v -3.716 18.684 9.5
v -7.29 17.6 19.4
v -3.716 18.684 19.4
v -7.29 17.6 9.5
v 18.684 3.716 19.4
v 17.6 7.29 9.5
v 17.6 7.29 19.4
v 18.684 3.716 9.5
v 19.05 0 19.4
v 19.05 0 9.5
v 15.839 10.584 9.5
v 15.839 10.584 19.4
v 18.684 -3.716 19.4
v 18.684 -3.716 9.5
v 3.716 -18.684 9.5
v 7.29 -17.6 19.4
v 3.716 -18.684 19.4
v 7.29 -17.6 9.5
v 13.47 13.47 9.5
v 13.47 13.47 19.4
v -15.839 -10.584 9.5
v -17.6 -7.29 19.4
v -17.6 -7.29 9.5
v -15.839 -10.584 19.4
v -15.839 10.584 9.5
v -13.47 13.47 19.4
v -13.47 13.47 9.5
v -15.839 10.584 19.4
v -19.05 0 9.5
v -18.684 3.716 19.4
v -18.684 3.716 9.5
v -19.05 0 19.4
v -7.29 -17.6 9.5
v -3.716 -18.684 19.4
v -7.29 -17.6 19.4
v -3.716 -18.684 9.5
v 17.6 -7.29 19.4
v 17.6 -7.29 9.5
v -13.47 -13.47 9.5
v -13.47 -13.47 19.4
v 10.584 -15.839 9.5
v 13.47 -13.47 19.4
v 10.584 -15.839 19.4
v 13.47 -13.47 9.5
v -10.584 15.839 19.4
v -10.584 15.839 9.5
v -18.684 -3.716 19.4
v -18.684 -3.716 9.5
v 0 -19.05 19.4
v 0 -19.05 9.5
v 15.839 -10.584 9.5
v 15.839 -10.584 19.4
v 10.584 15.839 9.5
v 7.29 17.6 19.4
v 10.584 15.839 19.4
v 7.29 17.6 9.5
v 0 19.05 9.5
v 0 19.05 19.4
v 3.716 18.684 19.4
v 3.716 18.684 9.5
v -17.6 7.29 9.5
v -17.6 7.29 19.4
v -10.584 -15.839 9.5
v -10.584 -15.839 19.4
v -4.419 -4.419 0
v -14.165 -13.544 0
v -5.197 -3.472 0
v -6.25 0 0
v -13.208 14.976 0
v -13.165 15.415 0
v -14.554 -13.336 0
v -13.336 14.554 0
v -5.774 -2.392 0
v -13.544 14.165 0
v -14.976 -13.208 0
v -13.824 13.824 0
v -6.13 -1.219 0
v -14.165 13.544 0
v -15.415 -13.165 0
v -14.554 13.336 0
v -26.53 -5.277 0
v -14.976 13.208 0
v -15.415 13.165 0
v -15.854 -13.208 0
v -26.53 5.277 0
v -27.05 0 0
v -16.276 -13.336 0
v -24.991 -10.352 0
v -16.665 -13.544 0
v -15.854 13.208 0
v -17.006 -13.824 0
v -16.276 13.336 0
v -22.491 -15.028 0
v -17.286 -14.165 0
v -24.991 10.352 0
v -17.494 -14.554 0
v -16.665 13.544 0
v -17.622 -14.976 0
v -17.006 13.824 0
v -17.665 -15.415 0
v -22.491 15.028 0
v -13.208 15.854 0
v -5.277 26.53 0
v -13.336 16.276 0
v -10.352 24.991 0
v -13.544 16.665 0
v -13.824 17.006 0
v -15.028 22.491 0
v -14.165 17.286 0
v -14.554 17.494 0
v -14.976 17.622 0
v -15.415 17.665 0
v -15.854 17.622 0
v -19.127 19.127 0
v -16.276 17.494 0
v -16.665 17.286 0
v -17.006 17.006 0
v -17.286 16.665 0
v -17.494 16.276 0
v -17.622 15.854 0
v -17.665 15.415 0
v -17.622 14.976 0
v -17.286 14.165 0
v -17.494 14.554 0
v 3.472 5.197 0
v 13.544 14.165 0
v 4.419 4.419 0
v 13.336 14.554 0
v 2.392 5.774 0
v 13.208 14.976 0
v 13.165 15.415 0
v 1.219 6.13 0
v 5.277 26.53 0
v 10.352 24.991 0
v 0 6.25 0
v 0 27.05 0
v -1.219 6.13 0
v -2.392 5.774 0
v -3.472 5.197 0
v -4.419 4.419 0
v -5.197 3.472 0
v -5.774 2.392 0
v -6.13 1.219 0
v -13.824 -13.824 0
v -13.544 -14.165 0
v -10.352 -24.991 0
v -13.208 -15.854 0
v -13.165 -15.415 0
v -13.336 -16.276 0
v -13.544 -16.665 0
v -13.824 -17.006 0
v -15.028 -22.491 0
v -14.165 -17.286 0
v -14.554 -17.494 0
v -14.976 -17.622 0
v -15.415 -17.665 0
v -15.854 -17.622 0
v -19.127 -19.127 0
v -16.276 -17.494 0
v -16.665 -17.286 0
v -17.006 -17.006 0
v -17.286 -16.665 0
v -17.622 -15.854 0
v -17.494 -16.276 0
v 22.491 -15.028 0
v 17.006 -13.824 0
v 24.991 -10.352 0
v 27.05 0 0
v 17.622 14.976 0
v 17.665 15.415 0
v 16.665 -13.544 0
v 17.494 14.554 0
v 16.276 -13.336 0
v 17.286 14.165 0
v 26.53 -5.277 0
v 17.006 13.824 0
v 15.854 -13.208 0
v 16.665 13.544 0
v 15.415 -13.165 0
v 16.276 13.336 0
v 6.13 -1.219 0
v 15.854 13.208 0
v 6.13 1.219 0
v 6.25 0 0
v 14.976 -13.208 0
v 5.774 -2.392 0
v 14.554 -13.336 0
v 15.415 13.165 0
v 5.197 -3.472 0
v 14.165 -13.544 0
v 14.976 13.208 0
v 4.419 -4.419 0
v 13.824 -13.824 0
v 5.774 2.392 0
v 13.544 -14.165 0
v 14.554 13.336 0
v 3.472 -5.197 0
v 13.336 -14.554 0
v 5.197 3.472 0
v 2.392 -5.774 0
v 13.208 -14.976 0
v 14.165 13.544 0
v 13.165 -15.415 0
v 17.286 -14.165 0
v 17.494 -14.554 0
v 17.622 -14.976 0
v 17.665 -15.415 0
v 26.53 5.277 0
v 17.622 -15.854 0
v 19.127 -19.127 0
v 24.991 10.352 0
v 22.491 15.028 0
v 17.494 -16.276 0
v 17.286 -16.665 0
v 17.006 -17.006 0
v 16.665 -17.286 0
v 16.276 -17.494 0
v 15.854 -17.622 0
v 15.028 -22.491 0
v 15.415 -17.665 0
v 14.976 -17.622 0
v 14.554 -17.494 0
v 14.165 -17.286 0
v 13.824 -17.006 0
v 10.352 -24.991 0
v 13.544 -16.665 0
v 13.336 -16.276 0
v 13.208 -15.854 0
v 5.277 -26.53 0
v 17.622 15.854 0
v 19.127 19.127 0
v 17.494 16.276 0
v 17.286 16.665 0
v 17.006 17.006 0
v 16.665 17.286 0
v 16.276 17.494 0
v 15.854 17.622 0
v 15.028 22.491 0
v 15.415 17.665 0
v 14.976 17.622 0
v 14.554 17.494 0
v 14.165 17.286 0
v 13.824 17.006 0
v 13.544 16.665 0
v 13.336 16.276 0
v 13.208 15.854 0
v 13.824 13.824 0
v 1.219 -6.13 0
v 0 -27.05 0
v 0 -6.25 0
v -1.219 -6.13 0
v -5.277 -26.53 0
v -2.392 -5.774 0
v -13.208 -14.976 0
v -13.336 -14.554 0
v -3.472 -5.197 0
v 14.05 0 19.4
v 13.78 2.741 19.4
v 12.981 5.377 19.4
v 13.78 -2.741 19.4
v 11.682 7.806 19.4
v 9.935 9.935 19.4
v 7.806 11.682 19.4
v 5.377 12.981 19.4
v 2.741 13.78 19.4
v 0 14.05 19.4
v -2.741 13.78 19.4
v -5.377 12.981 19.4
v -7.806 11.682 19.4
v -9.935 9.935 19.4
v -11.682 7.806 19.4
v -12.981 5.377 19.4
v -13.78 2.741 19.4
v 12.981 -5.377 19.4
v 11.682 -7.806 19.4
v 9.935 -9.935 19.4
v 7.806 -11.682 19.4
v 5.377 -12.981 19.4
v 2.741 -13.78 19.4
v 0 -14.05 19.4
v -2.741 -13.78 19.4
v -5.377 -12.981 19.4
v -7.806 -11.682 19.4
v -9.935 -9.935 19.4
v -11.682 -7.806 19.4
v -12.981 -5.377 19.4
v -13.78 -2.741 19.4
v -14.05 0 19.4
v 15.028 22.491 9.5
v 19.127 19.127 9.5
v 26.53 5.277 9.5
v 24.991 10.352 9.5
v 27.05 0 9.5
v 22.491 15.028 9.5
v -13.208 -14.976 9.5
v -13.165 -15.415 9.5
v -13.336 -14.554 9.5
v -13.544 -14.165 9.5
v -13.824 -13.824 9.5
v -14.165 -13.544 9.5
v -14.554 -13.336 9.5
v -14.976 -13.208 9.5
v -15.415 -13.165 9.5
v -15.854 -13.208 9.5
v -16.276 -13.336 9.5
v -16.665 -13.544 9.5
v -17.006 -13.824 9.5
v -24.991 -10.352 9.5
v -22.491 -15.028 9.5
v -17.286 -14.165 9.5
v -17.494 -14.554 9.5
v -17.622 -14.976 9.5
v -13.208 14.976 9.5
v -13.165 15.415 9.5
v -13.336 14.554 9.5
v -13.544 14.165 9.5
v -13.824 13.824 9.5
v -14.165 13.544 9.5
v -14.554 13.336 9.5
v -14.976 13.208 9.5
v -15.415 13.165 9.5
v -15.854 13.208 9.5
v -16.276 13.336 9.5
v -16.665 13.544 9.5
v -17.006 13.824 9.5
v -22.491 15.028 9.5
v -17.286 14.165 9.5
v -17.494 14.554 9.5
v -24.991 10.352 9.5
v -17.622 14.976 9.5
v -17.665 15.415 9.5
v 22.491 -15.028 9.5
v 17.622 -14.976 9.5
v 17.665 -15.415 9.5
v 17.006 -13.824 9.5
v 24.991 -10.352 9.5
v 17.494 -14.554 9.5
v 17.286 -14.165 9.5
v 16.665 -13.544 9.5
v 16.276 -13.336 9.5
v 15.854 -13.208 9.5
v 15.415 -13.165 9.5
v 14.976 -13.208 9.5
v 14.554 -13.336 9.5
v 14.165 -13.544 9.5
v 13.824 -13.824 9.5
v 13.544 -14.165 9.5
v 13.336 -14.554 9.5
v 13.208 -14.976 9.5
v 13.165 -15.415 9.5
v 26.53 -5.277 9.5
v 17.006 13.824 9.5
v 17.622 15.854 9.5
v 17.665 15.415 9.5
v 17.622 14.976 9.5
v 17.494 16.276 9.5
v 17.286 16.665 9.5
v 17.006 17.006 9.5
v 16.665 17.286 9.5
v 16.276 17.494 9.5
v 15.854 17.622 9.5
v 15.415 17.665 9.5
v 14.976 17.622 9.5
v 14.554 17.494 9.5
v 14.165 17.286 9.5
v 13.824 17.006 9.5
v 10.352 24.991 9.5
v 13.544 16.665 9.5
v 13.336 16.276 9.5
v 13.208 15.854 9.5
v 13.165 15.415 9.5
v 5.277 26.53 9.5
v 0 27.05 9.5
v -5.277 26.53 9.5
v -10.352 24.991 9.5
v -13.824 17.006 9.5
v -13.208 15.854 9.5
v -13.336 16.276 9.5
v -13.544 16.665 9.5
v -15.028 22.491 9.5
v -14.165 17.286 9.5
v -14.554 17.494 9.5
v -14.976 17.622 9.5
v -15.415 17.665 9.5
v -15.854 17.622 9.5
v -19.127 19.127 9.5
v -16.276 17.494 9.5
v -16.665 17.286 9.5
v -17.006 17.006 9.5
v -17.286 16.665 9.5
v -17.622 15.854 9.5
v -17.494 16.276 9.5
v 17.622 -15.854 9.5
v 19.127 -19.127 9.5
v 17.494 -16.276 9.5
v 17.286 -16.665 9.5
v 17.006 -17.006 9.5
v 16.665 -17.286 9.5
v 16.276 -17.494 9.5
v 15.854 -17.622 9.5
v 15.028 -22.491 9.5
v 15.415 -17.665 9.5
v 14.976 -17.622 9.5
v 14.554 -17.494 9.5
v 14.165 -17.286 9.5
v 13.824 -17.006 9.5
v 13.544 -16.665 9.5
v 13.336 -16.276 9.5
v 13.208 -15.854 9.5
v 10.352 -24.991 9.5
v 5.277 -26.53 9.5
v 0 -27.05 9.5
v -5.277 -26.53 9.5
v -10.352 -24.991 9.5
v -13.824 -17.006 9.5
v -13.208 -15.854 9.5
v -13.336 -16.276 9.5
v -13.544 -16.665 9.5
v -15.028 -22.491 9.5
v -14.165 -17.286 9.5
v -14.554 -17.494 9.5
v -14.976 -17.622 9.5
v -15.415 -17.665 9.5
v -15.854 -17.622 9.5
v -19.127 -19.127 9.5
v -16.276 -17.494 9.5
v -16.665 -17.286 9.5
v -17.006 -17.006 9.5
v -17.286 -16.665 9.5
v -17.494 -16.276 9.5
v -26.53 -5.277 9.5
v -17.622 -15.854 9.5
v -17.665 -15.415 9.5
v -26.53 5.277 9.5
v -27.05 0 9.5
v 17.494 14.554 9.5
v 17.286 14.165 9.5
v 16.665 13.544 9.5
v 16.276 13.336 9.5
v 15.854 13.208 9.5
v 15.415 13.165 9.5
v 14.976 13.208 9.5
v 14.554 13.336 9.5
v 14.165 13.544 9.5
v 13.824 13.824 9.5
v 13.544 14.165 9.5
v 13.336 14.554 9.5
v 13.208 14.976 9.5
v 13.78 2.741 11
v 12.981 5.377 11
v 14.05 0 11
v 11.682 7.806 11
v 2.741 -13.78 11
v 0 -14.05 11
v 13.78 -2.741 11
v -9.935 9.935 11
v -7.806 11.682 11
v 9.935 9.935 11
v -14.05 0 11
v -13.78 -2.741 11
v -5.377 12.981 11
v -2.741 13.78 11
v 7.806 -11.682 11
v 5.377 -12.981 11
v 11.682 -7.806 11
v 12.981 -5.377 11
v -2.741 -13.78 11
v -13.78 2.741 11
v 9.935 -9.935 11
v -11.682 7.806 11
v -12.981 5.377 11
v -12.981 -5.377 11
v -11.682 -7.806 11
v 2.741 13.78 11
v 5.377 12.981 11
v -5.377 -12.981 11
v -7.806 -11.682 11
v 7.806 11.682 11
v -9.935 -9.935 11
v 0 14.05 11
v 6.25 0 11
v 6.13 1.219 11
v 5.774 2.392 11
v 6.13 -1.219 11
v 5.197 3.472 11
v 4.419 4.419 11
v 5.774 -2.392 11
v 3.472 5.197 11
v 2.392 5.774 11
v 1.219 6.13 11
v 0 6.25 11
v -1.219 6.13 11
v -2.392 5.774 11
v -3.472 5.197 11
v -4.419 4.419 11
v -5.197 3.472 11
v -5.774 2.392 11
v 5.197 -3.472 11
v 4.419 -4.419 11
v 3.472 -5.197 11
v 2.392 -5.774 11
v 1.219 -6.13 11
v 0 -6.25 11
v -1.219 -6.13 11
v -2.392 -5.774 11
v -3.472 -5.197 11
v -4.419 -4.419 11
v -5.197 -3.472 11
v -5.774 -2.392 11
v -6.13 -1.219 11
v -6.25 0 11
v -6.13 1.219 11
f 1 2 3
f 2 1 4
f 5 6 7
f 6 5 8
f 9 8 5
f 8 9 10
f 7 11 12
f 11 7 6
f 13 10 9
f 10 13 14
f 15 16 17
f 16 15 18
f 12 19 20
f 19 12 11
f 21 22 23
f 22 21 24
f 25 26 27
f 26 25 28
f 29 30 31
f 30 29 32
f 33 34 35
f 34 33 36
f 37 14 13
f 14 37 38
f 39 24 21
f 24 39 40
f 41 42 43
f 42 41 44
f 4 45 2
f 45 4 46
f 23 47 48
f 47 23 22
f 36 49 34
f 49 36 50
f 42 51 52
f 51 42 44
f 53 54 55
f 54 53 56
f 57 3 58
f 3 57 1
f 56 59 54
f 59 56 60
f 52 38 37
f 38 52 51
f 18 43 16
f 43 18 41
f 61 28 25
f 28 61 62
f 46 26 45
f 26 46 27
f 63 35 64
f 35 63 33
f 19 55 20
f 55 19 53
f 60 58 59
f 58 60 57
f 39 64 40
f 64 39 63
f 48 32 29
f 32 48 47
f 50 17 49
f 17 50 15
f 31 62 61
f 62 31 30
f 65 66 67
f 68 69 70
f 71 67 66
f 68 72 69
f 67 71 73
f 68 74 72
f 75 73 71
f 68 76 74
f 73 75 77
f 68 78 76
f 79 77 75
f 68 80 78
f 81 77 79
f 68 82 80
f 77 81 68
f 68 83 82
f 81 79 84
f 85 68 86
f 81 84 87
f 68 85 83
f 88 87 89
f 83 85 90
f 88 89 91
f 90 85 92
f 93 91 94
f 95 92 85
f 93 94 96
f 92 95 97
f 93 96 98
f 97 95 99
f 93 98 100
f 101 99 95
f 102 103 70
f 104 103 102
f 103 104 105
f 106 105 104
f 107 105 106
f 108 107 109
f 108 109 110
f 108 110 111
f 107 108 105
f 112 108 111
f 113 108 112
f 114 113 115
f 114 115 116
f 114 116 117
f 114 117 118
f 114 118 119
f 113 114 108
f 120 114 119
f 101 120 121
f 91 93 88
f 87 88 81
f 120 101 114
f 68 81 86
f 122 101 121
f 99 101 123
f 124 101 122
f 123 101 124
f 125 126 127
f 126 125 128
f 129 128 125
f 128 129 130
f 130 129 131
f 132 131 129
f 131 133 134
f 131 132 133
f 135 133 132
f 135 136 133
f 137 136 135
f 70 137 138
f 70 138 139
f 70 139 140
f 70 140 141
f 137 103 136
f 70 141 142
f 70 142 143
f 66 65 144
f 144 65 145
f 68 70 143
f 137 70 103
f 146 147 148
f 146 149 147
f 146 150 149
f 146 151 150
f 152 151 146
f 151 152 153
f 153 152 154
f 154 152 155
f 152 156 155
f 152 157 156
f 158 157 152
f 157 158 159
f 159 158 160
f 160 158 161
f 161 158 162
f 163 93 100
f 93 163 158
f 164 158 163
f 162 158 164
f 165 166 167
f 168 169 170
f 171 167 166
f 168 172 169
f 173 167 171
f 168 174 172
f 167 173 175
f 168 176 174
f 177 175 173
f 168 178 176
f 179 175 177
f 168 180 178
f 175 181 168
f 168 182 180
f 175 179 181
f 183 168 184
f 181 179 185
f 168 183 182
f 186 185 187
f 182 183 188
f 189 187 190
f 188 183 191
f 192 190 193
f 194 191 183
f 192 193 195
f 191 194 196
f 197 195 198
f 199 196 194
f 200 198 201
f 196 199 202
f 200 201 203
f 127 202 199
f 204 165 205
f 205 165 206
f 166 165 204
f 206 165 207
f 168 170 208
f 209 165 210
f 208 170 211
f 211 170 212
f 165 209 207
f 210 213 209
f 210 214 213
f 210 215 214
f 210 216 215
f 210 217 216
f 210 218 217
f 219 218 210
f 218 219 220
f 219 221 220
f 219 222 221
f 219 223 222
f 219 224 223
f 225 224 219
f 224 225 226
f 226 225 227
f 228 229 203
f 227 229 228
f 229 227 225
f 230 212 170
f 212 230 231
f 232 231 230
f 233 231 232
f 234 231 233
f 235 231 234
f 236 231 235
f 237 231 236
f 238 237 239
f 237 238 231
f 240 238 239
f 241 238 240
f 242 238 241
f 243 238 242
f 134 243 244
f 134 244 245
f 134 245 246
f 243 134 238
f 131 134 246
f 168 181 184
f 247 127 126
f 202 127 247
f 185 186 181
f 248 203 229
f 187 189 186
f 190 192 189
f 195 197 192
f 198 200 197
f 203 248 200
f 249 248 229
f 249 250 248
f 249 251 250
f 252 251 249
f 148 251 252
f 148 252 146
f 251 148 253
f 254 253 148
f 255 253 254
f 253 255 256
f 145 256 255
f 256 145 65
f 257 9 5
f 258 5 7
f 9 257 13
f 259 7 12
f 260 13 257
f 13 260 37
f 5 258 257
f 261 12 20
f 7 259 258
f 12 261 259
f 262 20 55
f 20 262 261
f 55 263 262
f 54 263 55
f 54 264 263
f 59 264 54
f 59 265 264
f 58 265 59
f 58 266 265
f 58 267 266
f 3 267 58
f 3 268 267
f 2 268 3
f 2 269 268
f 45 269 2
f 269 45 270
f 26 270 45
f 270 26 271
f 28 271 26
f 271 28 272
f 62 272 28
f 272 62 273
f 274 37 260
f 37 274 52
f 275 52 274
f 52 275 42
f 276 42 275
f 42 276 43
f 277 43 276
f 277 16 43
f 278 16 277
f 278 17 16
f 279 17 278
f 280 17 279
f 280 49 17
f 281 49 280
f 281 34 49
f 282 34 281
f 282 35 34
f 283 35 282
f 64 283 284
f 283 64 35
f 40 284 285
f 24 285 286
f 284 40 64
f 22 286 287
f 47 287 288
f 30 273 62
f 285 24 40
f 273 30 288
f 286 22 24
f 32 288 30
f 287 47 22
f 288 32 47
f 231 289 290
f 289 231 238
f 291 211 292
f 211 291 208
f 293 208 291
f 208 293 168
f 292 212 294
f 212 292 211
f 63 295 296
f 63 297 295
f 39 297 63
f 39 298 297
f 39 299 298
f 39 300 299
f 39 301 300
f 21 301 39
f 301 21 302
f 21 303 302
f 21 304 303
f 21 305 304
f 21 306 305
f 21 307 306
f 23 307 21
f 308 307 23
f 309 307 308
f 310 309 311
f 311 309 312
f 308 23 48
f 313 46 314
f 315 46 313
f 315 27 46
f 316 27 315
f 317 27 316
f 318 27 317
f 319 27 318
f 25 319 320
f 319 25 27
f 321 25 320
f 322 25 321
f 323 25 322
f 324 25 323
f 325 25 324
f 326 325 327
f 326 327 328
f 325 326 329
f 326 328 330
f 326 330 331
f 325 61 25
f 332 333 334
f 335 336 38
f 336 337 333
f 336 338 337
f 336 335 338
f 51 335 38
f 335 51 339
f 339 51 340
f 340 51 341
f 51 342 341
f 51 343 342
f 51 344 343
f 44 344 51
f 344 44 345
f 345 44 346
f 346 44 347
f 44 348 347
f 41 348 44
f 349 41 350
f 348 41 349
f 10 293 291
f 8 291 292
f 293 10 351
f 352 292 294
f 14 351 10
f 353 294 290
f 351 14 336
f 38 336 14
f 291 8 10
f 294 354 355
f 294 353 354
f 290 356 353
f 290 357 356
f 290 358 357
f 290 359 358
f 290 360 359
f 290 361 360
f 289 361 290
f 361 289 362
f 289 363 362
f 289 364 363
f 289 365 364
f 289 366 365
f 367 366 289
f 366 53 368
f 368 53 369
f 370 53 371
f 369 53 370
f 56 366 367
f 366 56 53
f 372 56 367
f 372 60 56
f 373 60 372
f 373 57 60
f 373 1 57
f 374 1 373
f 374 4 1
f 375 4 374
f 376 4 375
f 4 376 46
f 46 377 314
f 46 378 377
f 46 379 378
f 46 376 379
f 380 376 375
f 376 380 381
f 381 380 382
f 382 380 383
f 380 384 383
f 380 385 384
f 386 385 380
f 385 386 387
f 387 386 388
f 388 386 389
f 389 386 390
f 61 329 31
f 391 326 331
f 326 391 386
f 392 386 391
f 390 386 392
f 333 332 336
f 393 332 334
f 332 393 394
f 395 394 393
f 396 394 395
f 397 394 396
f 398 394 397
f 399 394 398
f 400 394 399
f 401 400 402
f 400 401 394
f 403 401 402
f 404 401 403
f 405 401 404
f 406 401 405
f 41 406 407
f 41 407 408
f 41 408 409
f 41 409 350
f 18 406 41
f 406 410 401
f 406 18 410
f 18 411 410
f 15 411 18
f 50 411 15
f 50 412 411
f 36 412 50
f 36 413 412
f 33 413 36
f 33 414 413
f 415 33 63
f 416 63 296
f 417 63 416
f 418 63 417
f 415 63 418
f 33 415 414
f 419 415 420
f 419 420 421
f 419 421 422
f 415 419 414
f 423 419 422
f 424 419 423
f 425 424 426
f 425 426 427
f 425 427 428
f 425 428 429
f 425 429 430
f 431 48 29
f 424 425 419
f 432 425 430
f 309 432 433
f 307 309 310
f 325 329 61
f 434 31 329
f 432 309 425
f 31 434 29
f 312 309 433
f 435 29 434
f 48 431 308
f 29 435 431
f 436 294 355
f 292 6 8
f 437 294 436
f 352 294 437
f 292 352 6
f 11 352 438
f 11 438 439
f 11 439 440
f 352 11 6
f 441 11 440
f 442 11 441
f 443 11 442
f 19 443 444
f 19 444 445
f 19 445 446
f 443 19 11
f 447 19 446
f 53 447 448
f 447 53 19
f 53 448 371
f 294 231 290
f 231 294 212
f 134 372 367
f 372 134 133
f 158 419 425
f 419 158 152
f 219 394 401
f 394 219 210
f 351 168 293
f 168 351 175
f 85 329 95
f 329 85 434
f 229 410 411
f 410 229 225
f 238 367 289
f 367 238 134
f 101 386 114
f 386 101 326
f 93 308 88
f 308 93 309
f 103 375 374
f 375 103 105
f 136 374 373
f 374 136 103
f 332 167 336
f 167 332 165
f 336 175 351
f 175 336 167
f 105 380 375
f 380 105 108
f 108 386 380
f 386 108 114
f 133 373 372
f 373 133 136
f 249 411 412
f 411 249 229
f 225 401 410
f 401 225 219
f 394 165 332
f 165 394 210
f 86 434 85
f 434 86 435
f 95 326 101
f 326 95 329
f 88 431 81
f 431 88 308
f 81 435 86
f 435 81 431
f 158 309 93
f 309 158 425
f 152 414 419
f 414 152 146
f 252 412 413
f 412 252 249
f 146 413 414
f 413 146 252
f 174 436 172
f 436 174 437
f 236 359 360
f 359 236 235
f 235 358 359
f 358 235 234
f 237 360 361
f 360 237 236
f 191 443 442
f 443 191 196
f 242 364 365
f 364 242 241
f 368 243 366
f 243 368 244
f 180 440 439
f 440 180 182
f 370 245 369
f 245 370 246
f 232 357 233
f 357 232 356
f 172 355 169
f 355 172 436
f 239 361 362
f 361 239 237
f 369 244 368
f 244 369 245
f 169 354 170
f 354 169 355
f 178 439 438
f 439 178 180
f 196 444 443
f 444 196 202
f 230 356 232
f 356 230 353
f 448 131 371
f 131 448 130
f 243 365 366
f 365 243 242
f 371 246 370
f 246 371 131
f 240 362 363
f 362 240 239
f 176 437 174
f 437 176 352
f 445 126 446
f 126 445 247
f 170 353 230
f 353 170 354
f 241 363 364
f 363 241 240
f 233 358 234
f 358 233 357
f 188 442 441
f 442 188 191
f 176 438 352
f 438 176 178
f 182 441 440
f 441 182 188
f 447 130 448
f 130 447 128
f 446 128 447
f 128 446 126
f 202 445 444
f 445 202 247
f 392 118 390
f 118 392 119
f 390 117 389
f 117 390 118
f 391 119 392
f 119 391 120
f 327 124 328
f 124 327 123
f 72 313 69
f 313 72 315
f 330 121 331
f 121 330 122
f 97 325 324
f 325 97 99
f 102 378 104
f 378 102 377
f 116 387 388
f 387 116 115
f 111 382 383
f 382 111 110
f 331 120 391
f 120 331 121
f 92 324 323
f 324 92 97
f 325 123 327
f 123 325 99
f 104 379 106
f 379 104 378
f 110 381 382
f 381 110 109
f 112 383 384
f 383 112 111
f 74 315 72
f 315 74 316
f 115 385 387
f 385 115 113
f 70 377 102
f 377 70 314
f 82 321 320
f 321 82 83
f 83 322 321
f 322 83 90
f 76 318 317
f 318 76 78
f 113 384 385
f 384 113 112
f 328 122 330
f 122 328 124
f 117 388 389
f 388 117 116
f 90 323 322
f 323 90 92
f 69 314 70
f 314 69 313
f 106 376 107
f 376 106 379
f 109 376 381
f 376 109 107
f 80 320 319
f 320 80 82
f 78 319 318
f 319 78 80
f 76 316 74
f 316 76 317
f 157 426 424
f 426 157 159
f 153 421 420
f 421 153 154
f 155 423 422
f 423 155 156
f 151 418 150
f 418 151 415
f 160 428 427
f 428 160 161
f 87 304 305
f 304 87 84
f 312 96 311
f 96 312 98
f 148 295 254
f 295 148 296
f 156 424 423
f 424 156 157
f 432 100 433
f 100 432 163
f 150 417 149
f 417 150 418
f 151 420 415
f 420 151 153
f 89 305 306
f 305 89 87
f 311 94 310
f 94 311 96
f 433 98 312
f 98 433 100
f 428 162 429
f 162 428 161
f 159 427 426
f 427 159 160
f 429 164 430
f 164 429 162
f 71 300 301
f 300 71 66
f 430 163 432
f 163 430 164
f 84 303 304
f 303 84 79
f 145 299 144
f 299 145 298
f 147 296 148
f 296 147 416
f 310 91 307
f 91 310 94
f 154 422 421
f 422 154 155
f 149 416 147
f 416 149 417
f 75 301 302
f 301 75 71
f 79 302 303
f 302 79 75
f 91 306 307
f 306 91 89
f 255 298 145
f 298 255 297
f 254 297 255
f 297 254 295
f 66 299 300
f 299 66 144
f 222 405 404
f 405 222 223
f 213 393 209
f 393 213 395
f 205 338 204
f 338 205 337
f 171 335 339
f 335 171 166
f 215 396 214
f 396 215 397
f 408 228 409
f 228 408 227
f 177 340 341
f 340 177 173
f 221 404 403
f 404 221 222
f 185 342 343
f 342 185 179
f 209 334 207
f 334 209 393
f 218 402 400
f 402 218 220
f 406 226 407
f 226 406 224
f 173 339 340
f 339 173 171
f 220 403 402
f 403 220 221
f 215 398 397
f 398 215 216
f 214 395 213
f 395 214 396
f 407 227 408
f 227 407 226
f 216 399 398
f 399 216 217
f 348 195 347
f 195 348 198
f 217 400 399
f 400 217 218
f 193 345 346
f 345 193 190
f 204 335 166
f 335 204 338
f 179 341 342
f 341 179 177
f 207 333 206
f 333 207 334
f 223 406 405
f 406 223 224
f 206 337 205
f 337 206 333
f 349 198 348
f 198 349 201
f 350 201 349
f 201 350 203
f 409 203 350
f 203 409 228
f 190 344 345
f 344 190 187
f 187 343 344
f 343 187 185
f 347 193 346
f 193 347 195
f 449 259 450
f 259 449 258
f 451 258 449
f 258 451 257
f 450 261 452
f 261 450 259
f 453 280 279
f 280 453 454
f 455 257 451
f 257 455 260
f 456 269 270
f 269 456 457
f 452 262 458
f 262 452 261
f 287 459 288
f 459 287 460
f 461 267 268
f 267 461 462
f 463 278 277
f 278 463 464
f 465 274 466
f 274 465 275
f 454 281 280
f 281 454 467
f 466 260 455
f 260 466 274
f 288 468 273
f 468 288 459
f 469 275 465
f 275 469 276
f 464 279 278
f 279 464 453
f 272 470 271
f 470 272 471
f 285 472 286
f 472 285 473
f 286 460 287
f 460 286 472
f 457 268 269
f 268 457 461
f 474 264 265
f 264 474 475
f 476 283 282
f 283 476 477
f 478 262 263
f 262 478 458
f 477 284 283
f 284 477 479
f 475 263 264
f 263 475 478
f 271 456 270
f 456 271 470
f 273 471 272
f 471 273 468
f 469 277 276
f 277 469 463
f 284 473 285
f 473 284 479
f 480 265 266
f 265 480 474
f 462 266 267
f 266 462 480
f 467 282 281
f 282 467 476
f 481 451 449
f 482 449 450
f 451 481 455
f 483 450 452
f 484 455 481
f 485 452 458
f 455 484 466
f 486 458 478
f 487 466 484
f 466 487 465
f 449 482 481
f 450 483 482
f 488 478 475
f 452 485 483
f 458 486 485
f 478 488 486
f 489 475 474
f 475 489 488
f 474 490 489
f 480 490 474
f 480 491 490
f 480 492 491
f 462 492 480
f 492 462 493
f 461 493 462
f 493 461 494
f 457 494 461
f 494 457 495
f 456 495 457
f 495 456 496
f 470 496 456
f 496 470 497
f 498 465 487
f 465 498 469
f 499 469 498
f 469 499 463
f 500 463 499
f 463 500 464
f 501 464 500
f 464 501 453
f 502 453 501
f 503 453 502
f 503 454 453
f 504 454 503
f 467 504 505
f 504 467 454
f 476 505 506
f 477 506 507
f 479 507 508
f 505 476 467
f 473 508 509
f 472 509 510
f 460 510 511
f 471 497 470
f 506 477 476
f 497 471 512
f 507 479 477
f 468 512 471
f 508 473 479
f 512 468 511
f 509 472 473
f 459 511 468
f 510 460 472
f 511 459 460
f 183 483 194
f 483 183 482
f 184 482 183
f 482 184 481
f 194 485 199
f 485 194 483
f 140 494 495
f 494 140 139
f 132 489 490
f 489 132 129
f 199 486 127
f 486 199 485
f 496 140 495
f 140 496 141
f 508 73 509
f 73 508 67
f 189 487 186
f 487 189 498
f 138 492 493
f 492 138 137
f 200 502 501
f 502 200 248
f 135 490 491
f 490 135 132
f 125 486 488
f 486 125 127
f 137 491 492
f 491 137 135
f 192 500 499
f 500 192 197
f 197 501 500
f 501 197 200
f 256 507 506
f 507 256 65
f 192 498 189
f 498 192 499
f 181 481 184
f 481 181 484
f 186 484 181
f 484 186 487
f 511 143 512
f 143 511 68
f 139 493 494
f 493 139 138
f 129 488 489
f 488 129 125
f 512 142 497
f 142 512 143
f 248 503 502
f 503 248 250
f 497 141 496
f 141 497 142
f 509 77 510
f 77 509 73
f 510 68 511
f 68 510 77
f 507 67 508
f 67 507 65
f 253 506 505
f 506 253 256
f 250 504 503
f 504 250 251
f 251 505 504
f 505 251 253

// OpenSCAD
$fn = 32;

// ----------------------------------------------------------------------
// Bearing housing: seat for 6001 (28 x 8 mm), 38.1 mm body
// ----------------------------------------------------------------------

// --- parameters (mm) ---
housing_d = 38.1;         // housing outside diameter
housing_h = 19.4;         // overall housing height
wall_t = 5;               // wall thickness
seat_d = 28.1;            // 6001 seat, 0.1 mm clearance
seat_h = 8.4;             // pocket depth
shoulder = 3;             // shoulder under the bearing
pass_d = 12.5;            // shaft passage
flange_d = 54.1;          // mounting flange diameter
flange_t = 8;             // flange thickness
bolt_d = 4.5;             // flange bolt clearance
bolt_r = 21.8;            // flange bolt circle radius

module body() {
  cylinder(h = housing_h, d = housing_d);
}

module flange() {
  /* flange sunk 1.5 mm into the body */
  cylinder(h = flange_t + 1.5, d = flange_d);
}

difference() {
  union() {
    body();
    flange();
  }
  translate([0, 0, housing_h - seat_h]) cylinder(h = seat_h + 1, d = seat_d);
  translate([0, 0, -1]) cylinder(h = housing_h - seat_h + 1, d = pass_d);
  for (i = [0 : 3]) rotate([0, 0, 45 + i * 90]) translate([bolt_r, 0, -1])
    cylinder(h = flange_t + 3, d = bolt_d);
}
